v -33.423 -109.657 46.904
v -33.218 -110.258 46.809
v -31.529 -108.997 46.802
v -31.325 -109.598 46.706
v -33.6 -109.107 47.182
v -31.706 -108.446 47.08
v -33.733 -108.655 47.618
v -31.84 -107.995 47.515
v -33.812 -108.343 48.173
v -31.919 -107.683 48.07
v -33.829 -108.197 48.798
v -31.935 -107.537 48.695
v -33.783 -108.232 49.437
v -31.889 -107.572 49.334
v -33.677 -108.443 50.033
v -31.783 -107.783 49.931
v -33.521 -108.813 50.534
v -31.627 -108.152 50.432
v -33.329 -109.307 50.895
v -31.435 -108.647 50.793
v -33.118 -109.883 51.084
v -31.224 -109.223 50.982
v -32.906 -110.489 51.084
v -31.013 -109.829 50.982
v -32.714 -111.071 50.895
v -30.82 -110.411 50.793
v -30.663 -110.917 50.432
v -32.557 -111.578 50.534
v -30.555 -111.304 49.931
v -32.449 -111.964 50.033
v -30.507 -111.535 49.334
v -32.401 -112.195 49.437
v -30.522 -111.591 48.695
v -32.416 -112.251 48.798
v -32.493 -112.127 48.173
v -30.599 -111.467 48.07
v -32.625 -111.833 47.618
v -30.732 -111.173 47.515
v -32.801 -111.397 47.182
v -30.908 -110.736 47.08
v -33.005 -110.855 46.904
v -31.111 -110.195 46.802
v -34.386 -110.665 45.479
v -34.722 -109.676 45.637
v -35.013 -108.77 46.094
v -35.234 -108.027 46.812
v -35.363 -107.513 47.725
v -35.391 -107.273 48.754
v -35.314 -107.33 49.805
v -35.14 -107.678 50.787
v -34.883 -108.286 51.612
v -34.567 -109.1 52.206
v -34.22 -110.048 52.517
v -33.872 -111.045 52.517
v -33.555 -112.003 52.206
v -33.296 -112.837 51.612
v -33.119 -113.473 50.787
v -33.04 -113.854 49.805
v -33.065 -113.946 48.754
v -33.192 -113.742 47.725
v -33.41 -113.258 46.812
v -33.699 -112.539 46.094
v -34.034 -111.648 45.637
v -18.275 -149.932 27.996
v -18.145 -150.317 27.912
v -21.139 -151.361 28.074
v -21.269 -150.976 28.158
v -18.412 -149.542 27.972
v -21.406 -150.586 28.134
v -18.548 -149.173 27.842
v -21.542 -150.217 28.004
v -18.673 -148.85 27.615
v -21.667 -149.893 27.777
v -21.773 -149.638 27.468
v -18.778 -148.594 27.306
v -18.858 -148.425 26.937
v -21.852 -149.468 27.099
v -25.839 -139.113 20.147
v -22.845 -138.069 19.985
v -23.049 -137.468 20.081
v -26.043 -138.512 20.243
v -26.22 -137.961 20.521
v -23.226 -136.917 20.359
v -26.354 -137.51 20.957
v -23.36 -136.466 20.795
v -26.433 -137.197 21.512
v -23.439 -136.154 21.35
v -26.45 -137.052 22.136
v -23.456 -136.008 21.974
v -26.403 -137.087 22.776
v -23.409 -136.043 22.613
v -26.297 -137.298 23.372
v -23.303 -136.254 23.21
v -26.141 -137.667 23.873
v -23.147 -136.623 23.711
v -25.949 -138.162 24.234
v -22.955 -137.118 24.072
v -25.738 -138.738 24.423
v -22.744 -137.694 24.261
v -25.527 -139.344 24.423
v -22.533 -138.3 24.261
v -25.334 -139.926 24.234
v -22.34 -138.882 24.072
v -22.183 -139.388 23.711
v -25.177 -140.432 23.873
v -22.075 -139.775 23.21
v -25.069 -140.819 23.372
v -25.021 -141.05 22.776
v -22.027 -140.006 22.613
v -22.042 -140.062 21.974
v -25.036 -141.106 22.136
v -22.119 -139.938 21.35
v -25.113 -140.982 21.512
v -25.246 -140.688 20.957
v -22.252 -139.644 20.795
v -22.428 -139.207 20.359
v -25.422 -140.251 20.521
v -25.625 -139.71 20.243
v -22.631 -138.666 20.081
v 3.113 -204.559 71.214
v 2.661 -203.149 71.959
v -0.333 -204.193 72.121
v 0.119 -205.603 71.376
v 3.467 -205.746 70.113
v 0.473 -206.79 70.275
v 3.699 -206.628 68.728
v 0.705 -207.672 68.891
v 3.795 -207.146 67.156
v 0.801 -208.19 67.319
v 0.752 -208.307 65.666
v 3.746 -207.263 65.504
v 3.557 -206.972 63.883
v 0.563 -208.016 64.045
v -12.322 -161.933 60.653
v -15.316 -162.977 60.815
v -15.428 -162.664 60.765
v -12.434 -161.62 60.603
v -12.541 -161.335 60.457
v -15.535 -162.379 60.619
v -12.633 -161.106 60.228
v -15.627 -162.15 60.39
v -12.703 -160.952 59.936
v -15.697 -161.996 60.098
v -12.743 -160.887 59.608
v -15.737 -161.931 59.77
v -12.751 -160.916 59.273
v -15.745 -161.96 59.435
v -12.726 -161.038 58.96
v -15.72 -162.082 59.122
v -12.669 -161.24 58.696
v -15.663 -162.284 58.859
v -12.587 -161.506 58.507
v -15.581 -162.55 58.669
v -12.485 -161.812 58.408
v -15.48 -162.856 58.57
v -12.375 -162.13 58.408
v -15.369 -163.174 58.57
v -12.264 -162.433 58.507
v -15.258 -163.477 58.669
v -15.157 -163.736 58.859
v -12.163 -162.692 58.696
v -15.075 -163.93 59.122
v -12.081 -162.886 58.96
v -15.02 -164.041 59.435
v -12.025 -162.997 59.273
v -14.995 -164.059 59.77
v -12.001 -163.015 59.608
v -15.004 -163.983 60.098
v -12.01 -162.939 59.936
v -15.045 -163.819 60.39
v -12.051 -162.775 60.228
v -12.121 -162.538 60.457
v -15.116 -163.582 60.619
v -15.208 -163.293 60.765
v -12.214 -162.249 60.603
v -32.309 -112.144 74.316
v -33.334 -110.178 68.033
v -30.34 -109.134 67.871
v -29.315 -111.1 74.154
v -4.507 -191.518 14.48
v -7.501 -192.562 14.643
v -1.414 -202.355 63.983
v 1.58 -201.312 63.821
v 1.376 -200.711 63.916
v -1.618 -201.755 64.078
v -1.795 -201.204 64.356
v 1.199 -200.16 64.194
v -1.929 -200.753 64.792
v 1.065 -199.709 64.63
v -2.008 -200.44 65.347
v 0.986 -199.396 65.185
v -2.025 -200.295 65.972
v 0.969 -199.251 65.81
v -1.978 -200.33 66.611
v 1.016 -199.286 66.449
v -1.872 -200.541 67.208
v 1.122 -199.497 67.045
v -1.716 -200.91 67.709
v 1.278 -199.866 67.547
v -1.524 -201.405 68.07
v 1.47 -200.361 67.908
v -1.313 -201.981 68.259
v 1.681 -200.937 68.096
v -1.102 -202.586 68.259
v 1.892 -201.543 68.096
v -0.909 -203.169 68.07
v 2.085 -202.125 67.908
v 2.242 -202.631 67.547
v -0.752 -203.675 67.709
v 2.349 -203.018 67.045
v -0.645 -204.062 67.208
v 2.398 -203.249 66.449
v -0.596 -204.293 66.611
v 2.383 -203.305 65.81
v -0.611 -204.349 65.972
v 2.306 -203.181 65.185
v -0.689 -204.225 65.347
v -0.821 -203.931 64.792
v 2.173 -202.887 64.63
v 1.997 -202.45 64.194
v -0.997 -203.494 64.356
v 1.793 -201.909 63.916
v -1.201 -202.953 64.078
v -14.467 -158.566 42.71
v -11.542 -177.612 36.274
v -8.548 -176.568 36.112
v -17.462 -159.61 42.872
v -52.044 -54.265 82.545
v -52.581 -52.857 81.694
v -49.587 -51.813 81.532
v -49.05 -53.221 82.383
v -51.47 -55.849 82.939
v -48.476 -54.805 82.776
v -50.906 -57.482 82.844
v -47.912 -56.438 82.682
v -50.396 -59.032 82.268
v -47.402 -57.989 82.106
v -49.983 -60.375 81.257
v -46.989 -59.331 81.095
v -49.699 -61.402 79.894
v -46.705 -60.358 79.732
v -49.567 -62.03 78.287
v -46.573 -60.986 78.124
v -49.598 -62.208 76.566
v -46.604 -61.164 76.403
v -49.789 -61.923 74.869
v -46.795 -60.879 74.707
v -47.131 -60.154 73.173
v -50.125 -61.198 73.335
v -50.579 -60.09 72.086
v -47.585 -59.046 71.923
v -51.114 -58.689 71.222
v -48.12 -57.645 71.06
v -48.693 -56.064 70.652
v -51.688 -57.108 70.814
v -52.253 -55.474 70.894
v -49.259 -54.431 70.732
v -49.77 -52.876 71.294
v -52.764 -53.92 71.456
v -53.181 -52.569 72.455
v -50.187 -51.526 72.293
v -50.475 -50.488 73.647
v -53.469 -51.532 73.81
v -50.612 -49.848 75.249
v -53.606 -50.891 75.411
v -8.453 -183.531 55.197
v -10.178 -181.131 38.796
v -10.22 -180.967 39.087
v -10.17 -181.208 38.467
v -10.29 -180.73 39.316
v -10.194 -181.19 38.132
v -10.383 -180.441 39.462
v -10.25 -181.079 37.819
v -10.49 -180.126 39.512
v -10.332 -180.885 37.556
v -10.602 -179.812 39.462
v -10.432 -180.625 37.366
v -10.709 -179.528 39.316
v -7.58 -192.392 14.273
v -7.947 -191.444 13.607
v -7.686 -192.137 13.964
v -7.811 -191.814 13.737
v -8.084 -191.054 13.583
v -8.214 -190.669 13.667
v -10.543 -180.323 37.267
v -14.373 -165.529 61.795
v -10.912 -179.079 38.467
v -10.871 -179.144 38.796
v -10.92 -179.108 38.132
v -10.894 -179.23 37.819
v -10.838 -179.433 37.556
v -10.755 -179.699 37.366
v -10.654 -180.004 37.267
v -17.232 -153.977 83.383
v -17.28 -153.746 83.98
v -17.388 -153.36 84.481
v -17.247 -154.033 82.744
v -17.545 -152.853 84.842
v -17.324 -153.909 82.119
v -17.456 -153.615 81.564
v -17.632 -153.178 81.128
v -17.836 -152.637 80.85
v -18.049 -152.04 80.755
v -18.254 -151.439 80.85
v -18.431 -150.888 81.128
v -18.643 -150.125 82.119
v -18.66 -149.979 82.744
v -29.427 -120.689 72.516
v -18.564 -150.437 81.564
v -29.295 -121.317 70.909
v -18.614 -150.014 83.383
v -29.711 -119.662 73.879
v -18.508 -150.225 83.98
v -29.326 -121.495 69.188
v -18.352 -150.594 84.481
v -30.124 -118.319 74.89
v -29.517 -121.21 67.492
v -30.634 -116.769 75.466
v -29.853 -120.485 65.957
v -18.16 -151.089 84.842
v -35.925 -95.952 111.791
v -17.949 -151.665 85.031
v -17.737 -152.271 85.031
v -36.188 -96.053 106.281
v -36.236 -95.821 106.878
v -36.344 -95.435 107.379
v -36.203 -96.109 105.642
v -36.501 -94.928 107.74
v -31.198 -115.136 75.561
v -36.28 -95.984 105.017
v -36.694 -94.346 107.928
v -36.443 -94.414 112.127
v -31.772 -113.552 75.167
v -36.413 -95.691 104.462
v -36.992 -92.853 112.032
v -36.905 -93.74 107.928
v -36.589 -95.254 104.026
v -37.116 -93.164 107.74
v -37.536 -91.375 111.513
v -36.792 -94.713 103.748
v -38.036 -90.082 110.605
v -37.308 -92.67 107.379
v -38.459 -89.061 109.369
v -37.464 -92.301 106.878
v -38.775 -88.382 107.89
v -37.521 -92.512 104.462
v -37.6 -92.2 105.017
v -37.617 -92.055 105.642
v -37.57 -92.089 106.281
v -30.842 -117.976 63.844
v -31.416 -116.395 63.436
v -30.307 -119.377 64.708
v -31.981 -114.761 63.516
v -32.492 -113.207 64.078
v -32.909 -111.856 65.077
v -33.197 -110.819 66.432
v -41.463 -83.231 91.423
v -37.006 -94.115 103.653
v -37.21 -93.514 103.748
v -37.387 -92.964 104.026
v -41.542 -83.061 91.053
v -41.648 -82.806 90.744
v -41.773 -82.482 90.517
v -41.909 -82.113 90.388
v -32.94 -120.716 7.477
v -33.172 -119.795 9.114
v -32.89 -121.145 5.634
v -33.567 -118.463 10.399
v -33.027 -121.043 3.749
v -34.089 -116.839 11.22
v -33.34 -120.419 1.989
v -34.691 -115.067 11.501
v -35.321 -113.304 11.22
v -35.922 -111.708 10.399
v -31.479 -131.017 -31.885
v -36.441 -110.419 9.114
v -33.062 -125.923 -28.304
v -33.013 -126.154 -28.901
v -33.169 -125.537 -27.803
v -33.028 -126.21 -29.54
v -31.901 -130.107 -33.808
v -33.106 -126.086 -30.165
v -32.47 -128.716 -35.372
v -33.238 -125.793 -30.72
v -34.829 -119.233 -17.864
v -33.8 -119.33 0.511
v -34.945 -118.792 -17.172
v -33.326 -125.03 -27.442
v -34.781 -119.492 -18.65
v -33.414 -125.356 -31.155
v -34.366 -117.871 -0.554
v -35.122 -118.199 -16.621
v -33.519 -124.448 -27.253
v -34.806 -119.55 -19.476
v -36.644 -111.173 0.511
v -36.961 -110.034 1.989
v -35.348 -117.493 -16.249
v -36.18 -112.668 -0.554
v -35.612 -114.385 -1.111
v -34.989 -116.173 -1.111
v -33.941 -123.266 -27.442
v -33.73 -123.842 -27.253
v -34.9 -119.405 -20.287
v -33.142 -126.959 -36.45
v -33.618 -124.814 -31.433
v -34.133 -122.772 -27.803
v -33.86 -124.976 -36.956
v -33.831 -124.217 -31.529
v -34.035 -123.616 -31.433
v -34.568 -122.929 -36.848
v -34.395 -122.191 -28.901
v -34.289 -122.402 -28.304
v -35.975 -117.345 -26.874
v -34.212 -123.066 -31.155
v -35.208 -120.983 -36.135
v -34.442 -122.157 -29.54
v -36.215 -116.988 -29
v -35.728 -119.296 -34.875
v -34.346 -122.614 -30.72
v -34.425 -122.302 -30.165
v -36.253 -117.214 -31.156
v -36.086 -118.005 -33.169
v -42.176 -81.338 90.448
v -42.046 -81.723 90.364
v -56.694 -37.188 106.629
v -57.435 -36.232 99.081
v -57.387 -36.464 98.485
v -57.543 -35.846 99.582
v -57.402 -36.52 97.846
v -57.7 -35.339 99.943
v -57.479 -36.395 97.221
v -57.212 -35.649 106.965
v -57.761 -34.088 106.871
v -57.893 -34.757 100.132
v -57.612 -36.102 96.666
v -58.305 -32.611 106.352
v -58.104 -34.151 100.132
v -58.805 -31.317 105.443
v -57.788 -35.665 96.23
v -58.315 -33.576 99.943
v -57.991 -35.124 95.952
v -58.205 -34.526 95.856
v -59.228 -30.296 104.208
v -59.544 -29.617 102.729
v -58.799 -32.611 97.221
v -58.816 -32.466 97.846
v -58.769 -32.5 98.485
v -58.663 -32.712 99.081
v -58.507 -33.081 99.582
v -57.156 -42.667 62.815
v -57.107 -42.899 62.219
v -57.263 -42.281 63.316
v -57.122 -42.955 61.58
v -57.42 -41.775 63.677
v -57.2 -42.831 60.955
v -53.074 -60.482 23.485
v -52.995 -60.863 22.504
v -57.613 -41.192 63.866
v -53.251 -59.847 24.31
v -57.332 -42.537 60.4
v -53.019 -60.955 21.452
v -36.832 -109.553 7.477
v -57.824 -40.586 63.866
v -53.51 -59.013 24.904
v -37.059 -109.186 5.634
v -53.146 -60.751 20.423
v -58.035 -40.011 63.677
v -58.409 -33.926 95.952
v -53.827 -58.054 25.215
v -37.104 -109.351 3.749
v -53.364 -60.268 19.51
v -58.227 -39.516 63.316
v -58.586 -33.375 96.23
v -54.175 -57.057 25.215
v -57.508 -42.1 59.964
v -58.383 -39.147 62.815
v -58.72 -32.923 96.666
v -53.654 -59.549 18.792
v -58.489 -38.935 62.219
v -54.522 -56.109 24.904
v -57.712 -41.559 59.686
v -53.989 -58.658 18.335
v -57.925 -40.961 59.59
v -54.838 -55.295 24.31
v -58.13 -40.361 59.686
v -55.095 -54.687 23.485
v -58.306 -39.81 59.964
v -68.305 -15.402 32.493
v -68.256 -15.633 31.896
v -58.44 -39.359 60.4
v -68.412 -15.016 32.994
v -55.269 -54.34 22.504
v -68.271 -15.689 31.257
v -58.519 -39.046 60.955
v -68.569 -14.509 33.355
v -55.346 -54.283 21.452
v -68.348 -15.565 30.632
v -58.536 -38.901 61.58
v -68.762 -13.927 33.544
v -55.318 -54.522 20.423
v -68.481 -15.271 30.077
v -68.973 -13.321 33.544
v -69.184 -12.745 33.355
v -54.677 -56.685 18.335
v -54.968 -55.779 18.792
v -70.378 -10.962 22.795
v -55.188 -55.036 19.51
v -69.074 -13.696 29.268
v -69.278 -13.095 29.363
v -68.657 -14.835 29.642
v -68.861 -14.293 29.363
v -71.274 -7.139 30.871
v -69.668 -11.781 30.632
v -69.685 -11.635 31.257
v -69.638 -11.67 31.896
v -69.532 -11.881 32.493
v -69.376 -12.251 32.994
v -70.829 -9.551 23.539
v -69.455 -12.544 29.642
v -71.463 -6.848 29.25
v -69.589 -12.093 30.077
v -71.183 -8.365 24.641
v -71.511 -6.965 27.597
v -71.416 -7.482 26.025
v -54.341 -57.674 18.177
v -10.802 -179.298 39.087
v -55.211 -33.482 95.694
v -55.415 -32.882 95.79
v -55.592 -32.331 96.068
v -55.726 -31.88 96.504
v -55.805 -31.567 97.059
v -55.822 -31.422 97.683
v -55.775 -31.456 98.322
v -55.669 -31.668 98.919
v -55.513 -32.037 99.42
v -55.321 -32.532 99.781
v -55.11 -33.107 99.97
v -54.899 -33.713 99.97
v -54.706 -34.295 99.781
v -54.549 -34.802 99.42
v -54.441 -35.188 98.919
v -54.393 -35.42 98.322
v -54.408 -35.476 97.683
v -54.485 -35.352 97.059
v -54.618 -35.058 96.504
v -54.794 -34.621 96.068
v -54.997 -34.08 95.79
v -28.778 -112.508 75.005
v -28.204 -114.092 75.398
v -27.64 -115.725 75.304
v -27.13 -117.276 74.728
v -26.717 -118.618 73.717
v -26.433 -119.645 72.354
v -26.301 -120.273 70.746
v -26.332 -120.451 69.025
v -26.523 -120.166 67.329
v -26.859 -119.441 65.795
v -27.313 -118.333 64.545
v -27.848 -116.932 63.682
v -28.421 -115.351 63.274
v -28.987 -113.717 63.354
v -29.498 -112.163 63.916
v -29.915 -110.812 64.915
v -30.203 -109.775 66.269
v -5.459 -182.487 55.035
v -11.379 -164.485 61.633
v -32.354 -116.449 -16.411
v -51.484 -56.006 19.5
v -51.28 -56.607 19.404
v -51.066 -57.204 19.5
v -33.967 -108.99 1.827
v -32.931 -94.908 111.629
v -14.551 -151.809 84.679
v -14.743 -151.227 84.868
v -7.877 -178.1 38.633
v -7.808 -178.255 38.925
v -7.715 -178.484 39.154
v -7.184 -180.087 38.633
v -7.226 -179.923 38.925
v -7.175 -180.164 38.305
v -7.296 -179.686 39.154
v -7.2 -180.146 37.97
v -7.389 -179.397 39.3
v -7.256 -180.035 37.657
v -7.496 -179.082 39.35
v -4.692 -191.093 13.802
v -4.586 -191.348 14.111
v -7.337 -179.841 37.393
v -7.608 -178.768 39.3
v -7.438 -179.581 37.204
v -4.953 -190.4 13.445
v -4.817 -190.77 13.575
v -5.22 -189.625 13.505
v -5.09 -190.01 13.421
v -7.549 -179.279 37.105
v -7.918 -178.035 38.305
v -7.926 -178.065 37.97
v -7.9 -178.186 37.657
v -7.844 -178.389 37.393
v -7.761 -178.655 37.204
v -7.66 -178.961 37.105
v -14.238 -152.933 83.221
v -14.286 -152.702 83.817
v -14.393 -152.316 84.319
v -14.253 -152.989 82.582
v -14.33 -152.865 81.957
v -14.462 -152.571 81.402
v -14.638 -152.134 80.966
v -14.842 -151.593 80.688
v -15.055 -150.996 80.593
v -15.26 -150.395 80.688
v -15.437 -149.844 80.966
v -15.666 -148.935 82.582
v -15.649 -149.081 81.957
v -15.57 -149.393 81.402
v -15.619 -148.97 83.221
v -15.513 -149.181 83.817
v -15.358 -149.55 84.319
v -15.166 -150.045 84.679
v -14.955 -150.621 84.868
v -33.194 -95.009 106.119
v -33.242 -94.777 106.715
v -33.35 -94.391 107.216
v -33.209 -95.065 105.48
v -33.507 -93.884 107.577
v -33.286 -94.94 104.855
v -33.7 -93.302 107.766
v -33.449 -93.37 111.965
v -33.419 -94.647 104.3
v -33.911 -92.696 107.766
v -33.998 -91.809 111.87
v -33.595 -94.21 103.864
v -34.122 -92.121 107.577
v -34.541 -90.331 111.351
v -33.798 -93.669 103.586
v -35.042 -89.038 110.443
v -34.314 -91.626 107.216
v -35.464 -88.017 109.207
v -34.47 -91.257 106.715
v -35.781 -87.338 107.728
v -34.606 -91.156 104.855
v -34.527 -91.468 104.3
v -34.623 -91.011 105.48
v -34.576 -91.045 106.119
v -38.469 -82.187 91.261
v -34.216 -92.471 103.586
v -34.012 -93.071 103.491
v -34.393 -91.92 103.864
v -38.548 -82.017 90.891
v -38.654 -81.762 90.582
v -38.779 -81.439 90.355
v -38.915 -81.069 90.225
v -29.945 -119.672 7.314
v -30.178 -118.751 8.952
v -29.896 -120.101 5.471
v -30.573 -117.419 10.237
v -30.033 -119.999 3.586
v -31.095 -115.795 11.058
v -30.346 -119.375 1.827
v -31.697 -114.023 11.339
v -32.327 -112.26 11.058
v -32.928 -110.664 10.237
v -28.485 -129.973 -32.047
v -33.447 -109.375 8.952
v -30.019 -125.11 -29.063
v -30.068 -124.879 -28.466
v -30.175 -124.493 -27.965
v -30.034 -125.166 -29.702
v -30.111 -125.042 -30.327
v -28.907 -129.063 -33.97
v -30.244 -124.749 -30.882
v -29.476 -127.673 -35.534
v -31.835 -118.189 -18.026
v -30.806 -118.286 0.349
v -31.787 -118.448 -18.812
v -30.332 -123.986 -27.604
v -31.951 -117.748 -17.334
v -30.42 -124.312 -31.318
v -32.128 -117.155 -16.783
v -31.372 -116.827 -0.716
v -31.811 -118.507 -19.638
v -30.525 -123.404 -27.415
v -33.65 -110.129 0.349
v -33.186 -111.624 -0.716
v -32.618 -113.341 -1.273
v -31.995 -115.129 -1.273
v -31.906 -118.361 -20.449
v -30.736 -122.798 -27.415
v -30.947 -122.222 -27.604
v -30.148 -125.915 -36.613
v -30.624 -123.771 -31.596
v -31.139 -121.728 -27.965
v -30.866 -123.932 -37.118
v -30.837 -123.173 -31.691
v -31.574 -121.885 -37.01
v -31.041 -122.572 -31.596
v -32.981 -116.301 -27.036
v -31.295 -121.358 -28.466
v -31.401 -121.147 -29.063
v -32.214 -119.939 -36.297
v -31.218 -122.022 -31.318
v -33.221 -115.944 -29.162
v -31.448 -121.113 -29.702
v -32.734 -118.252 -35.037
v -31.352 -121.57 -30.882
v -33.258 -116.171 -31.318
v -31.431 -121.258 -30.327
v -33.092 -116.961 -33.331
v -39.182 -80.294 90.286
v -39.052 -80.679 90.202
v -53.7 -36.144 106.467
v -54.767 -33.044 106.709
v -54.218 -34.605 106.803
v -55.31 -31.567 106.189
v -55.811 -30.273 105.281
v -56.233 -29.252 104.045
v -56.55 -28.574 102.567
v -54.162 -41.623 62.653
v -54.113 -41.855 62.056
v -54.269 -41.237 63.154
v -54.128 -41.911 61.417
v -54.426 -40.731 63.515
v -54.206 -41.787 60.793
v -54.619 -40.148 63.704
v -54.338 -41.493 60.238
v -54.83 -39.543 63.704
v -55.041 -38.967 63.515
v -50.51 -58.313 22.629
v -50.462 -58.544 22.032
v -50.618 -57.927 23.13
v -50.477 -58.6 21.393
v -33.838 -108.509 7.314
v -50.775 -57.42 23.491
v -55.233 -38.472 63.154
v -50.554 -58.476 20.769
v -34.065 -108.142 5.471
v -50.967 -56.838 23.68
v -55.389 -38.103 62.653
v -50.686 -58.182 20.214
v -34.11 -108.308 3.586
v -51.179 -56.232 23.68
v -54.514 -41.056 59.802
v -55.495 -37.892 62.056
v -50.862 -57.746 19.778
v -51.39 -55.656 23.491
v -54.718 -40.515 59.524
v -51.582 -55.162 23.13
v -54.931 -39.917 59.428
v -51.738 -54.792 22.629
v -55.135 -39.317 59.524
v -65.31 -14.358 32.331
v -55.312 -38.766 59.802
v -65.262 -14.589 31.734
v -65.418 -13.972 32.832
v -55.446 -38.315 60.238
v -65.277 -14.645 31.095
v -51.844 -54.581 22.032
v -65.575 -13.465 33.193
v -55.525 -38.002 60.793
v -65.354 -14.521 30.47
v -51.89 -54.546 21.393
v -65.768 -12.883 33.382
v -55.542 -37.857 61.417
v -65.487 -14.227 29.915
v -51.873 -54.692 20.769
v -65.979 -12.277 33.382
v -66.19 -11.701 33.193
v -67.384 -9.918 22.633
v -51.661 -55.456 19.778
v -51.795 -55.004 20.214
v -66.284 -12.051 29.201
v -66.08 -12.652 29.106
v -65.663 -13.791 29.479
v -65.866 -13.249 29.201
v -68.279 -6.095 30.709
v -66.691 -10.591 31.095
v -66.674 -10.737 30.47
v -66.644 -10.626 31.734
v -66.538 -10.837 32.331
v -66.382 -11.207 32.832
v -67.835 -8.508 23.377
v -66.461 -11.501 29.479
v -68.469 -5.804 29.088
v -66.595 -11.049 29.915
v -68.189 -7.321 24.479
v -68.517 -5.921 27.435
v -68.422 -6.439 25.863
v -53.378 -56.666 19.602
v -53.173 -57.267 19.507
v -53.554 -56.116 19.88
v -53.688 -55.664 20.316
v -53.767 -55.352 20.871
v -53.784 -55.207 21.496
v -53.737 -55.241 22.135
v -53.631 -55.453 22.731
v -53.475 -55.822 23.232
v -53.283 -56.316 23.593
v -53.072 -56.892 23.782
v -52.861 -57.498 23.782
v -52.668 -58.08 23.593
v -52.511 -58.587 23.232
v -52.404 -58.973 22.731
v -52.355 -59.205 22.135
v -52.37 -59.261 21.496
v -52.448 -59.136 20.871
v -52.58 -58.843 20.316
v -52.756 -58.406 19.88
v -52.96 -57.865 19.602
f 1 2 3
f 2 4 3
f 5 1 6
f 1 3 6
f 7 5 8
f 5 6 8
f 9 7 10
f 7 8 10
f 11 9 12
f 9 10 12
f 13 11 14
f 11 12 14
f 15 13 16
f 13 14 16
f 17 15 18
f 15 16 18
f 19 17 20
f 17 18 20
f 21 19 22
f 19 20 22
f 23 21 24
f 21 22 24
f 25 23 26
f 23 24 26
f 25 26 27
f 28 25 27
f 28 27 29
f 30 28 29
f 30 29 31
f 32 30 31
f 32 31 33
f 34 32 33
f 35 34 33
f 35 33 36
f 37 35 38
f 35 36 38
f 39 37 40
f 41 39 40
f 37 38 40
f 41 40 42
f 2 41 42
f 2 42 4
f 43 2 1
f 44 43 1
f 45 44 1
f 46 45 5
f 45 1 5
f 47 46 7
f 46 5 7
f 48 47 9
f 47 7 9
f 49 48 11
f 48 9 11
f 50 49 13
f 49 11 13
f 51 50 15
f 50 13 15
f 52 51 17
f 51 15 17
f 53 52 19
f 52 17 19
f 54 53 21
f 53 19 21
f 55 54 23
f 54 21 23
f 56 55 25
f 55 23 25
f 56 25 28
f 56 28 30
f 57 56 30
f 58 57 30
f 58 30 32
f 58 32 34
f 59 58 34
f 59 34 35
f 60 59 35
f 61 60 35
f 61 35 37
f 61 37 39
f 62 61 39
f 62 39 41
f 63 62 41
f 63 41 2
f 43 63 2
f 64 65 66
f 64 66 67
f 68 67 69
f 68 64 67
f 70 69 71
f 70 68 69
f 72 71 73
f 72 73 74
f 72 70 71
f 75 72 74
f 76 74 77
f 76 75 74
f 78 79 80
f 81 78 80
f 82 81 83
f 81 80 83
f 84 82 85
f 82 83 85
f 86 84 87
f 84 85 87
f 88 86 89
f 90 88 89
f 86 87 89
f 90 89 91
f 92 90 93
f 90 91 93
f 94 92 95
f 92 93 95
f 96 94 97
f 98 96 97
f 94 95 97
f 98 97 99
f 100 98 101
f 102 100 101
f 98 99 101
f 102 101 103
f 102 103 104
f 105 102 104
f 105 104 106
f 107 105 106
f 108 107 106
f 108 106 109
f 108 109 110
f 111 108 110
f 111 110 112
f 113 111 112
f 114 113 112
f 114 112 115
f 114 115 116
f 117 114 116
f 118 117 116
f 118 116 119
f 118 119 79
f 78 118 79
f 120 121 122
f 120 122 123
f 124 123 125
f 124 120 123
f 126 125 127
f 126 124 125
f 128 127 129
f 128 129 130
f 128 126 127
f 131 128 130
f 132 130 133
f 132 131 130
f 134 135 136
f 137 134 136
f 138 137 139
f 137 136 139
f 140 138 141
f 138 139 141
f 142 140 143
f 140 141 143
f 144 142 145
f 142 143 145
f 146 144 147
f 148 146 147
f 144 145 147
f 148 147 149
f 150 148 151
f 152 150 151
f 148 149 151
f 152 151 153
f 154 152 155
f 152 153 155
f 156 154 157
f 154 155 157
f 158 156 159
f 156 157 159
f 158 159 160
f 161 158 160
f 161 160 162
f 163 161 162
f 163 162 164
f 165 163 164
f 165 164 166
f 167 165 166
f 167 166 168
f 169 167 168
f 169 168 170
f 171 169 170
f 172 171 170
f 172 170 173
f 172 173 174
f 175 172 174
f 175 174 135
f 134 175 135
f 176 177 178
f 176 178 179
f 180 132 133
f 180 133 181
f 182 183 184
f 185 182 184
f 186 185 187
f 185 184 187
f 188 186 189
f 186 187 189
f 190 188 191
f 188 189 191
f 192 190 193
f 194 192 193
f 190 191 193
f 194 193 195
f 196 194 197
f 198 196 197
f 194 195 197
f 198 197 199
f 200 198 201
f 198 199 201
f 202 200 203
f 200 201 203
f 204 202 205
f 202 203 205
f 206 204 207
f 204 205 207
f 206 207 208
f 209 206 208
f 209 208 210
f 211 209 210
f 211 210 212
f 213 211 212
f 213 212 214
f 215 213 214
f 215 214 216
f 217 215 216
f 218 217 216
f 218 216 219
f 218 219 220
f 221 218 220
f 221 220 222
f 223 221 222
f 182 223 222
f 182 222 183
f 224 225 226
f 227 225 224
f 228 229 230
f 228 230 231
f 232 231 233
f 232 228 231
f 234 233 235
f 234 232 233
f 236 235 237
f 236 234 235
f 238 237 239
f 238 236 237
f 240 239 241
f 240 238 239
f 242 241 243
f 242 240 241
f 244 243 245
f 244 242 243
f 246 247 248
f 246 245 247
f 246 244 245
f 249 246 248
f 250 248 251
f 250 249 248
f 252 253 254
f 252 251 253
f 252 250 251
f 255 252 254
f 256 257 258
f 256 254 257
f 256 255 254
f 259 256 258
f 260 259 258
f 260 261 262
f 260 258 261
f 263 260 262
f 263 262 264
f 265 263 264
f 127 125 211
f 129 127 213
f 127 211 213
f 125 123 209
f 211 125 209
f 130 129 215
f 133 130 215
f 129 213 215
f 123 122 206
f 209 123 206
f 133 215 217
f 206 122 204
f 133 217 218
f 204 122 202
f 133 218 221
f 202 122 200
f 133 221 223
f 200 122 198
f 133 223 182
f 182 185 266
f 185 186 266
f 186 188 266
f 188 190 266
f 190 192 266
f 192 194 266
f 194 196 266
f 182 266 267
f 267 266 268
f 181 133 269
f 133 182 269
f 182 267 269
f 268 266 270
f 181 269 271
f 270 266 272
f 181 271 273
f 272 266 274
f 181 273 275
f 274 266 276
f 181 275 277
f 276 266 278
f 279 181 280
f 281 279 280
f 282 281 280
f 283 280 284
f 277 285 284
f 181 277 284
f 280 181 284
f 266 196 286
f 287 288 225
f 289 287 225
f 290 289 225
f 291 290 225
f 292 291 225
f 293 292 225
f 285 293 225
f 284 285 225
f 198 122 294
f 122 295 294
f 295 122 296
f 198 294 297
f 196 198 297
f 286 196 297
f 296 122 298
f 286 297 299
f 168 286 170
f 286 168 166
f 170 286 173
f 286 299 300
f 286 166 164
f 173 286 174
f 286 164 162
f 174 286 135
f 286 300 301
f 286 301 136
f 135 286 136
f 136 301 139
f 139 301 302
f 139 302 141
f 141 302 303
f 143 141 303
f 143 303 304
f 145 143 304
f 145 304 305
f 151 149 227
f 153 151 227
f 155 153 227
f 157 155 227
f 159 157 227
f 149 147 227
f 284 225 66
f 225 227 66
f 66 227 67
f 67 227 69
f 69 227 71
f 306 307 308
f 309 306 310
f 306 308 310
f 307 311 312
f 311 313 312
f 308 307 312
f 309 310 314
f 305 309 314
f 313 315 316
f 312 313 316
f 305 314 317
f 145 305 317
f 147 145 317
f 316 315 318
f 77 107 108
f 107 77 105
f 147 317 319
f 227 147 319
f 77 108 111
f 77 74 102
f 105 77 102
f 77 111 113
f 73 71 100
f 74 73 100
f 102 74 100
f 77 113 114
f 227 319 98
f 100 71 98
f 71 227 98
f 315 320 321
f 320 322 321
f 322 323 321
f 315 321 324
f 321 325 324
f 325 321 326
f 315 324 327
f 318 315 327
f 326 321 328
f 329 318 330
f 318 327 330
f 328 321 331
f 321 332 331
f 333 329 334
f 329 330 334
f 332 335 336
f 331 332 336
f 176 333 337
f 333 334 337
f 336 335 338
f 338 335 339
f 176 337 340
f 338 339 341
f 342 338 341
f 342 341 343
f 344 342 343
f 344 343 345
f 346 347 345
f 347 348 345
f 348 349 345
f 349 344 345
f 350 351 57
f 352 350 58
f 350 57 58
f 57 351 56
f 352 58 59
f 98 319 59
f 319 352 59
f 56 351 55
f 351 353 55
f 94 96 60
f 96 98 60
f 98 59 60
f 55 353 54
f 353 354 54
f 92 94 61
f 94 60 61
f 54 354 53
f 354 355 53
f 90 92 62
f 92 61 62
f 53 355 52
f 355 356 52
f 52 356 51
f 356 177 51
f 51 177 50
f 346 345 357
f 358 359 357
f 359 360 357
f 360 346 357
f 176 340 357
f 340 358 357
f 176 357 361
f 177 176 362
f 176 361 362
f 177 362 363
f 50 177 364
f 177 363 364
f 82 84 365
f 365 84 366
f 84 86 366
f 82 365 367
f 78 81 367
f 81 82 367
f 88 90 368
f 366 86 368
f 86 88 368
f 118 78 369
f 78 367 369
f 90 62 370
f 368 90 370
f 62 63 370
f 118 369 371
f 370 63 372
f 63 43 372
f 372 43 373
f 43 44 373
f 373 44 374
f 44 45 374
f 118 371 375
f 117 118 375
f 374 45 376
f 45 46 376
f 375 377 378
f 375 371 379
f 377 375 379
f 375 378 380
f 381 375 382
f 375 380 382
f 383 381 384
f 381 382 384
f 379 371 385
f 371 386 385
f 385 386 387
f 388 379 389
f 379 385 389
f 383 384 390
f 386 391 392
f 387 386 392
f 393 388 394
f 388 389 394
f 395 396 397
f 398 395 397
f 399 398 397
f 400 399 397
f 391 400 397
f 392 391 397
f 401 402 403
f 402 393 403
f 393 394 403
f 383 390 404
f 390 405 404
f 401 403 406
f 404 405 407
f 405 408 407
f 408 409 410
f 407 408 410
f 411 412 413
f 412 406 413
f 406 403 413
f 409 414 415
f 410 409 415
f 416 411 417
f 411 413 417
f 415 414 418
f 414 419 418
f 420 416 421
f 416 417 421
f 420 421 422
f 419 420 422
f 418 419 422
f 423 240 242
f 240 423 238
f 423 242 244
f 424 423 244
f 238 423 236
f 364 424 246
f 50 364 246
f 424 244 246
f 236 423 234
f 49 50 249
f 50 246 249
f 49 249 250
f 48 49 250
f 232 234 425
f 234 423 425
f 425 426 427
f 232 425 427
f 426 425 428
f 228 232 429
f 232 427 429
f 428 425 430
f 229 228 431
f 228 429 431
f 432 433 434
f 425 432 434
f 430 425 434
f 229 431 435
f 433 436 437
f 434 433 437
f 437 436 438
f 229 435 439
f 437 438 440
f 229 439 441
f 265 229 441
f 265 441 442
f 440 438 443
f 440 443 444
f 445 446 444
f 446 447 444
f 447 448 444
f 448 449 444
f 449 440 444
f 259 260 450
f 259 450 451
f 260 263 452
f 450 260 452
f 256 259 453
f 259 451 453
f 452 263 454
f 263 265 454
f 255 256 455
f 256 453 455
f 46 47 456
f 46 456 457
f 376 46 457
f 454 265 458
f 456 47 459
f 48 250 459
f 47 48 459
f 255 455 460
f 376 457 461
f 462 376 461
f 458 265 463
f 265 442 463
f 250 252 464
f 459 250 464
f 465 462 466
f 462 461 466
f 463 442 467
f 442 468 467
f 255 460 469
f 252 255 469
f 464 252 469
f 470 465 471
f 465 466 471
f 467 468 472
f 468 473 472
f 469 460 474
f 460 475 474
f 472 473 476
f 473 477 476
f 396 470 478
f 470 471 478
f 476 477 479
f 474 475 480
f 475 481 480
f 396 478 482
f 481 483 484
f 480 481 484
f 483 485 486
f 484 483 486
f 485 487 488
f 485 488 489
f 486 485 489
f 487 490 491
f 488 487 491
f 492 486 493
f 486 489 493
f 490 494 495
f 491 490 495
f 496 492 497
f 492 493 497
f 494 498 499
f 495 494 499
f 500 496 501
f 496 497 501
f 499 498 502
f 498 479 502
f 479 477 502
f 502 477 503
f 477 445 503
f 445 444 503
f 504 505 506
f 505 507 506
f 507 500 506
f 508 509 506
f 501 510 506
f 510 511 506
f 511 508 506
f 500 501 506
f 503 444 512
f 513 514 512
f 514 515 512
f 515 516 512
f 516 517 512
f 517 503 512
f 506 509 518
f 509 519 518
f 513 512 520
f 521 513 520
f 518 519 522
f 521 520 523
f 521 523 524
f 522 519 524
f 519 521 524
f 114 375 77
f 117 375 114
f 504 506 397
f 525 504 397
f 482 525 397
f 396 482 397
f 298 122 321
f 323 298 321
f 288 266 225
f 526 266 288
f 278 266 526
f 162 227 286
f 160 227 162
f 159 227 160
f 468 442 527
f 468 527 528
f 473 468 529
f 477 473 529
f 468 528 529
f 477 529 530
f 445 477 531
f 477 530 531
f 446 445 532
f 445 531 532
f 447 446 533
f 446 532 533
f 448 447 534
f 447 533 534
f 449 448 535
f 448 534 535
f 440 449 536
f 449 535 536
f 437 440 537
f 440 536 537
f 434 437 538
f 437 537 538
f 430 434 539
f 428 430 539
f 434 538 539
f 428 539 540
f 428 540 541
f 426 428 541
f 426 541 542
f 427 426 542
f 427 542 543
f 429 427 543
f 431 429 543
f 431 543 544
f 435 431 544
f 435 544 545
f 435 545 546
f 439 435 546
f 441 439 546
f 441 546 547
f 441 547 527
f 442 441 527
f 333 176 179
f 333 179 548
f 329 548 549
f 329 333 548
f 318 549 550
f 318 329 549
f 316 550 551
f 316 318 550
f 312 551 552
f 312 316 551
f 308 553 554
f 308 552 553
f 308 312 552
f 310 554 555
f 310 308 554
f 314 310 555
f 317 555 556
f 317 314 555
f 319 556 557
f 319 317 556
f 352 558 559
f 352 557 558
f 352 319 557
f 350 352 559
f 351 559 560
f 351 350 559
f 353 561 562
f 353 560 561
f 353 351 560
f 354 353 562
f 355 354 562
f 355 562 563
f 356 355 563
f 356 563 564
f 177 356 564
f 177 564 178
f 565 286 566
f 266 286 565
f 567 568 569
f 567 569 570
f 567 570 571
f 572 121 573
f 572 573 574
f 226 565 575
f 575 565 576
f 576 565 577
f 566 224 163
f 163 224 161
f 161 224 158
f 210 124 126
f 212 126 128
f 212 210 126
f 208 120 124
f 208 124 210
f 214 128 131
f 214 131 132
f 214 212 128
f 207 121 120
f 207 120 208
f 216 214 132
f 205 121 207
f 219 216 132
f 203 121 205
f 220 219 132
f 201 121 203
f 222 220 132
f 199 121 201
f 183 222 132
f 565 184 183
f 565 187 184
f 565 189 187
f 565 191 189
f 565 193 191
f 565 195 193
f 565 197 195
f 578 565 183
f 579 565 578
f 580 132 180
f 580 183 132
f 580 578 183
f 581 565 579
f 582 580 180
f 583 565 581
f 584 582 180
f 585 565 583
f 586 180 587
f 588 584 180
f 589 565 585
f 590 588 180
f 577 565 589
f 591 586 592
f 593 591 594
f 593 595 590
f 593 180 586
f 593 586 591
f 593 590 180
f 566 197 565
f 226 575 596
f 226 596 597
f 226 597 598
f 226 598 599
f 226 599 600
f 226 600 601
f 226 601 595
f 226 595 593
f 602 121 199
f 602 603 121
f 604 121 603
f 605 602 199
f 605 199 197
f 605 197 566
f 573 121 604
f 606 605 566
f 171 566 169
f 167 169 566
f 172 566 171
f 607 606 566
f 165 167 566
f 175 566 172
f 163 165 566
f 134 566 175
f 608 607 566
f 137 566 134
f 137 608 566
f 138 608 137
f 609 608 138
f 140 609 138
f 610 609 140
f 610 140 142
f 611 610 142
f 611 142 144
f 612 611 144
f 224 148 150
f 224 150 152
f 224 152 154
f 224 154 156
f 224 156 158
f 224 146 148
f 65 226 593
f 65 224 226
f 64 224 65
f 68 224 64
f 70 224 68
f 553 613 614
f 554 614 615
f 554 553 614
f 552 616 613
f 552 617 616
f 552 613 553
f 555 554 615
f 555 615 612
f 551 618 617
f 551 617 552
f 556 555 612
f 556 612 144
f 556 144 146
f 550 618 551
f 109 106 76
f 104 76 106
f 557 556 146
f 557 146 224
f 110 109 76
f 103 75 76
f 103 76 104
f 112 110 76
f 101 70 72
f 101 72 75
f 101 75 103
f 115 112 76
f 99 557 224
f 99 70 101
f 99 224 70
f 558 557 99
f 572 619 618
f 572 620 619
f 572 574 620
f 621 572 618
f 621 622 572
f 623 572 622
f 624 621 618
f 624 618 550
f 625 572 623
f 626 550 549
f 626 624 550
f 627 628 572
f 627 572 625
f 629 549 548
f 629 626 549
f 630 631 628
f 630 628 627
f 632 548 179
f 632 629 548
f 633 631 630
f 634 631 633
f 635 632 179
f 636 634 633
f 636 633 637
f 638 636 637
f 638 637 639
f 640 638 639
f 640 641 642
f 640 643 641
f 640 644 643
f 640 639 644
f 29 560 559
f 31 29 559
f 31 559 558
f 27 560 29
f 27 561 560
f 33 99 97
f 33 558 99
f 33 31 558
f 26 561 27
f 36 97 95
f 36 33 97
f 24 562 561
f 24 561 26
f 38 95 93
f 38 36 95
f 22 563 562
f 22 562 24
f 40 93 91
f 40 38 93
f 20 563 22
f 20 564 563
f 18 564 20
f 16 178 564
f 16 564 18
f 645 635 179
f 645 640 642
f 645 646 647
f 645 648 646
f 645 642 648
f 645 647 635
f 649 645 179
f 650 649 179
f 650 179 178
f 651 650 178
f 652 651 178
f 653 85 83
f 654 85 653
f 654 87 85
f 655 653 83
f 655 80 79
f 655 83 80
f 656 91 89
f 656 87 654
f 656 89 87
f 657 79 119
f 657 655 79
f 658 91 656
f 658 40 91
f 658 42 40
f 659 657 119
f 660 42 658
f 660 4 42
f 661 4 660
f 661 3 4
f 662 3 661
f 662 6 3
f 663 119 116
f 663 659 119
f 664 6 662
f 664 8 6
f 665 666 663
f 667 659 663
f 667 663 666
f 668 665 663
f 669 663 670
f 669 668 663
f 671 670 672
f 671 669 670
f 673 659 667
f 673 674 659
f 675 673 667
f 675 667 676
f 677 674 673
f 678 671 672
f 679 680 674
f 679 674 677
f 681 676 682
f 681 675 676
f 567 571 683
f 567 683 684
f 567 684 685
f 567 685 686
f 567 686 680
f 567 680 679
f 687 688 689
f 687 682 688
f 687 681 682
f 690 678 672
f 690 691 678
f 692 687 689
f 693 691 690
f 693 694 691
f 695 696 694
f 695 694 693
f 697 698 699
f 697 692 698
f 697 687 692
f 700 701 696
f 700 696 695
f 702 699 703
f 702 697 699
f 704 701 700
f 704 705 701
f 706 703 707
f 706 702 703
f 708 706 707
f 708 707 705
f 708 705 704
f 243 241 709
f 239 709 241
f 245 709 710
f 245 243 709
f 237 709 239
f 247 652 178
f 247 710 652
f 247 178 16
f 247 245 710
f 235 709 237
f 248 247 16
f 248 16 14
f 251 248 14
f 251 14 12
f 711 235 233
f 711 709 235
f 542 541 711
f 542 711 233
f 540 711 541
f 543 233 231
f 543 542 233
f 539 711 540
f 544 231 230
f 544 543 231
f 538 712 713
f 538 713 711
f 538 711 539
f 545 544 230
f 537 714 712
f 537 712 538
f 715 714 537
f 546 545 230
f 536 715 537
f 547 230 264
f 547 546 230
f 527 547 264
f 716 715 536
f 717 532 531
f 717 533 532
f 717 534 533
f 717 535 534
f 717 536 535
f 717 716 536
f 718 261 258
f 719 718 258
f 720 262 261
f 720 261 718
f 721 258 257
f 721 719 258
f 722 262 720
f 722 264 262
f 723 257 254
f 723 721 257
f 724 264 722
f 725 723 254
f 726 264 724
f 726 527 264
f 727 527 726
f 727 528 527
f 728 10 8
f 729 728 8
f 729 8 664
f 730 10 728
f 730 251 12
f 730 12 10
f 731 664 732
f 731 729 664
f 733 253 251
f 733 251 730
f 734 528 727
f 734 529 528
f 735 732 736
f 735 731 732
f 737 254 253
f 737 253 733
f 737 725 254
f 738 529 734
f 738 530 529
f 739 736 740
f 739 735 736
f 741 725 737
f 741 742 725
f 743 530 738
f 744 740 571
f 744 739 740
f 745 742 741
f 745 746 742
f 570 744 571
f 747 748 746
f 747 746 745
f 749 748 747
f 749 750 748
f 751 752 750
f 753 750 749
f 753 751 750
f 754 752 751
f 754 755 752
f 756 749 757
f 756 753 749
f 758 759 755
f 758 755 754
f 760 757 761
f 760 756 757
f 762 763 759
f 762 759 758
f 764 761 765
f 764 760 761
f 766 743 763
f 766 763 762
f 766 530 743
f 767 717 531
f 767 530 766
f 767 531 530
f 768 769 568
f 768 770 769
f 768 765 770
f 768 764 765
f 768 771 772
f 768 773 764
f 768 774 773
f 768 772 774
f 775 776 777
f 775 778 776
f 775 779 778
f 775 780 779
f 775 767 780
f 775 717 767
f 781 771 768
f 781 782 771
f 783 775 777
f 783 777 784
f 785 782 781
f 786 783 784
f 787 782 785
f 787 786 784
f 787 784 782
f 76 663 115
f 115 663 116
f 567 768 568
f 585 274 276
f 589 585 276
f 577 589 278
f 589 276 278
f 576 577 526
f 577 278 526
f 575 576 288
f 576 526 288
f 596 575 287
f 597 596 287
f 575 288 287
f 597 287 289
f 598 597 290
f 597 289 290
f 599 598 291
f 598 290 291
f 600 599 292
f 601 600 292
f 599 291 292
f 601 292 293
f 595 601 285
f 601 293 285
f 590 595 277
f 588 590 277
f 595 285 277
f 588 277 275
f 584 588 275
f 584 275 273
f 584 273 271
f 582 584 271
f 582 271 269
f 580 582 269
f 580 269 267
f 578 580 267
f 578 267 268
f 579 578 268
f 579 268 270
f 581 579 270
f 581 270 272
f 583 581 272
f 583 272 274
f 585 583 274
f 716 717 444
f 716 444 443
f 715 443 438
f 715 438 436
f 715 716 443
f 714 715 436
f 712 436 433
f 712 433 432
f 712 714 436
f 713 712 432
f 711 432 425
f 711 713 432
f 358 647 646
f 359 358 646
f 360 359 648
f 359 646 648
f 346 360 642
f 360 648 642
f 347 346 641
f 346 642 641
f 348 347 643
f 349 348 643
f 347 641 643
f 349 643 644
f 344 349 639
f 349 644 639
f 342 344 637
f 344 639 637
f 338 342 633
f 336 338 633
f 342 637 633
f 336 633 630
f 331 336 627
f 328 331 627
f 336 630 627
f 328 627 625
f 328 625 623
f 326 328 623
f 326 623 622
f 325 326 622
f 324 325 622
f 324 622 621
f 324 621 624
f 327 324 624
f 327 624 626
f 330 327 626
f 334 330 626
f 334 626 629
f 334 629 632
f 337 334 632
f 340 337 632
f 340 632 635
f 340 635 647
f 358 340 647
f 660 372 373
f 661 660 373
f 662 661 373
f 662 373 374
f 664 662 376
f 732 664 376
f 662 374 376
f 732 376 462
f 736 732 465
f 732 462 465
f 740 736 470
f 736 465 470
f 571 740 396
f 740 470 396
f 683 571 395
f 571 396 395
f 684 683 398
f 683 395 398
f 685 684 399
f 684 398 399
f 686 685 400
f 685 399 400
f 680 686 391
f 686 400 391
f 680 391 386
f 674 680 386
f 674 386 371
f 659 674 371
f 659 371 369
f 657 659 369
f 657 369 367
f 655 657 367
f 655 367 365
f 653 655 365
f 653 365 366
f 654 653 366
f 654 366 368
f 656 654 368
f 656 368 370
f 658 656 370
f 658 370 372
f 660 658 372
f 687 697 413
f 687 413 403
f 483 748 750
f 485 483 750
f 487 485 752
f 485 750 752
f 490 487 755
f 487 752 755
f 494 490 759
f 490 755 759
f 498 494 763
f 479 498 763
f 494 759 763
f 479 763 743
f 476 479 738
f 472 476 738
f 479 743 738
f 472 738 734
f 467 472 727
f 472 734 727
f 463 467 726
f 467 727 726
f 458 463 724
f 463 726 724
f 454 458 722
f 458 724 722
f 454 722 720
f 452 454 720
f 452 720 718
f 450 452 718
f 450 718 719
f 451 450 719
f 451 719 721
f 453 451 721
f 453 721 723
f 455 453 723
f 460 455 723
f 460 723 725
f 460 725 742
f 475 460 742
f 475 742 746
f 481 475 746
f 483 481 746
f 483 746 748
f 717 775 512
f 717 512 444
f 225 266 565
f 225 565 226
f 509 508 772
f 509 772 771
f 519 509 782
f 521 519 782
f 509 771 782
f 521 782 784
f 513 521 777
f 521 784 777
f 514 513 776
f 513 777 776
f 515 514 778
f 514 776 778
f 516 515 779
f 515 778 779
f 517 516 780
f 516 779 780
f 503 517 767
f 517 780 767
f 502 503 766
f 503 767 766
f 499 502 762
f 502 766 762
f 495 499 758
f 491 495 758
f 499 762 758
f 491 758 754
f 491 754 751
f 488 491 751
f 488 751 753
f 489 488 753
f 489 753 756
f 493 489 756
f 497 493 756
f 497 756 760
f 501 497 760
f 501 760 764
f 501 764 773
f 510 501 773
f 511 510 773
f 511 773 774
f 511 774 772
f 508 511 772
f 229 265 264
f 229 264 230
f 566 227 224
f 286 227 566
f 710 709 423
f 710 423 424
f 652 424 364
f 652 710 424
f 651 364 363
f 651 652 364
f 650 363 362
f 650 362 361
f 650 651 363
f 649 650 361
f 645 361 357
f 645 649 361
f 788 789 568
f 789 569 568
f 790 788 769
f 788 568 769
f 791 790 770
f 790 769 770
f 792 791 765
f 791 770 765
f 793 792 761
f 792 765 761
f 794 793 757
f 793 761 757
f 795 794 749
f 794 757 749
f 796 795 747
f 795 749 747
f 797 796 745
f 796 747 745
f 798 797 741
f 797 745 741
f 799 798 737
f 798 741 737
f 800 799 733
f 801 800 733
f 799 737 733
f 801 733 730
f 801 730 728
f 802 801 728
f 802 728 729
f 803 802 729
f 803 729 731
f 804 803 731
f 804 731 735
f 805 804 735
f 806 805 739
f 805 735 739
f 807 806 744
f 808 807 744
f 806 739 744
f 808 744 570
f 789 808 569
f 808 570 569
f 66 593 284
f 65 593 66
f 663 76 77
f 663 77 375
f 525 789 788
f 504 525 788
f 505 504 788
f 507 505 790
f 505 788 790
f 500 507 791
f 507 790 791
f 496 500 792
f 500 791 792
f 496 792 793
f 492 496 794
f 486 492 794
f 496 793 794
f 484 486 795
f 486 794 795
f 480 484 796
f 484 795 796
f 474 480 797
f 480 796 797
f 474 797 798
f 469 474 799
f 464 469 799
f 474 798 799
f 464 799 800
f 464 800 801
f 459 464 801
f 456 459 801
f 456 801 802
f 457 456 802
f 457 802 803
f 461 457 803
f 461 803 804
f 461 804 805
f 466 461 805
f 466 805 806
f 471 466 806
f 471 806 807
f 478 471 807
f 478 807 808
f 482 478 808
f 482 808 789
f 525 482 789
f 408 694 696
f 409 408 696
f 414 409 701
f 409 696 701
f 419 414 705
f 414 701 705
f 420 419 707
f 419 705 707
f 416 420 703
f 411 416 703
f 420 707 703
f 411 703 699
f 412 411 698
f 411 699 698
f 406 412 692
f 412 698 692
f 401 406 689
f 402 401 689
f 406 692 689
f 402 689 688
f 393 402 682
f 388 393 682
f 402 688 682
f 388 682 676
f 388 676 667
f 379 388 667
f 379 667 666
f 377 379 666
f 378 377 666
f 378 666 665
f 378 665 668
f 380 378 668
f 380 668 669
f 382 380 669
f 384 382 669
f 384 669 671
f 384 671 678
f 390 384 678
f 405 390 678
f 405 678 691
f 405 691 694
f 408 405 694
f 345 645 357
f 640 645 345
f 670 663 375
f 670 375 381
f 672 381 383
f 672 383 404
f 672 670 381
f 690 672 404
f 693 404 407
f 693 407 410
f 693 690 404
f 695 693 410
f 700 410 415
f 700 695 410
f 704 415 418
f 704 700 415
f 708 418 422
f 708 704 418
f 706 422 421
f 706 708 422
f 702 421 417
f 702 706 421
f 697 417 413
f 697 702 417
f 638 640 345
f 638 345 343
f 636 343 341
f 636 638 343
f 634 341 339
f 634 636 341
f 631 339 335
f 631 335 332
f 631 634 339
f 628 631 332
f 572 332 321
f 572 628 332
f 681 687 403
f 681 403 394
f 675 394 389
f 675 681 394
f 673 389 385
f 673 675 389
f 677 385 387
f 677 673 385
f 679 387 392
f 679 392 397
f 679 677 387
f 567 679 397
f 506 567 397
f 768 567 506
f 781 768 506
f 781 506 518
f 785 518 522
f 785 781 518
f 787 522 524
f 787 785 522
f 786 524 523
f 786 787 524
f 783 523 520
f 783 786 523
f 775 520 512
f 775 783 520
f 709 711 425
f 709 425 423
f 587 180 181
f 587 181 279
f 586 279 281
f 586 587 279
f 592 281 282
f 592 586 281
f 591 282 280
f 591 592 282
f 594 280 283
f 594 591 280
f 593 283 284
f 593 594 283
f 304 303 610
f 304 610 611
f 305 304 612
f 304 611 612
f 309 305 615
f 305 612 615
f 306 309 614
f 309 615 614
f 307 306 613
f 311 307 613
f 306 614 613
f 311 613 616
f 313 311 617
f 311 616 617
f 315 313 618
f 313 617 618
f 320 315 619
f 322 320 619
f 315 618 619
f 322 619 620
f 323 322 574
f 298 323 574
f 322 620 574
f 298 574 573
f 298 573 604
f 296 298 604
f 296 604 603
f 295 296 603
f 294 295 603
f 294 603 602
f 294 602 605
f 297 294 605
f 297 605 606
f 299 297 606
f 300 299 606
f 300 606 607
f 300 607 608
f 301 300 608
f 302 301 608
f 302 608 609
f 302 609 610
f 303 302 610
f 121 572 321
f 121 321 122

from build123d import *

# Parameters (mm, degrees)
BOSS_EXTRUDE1_DEPTH                               = 3.175
F_6_CLEARANCE_HOLE2_D                             = 4.3053
CUT_EXTRUDE1_DEPTH                                = 75.708255191
CUT_EXTRUDE11_DEPTH                               = 75.708255191
SKETCH112_R                                       = 6.35
CUT_EXTRUDE13_DEPTH                               = 75.708255191
CSK_FOR_6_FLAT_HEAD_MACHINE_SCREW_100_D           = 4.3053
CSK_FOR_6_FLAT_HEAD_MACHINE_SCREW_100_CSINK_D     = 7.0866
CSK_FOR_6_FLAT_HEAD_MACHINE_SCREW_100_CSINK_ANGLE = 100
F_2_CLEARANCE_HOLE1_D                             = 2.2606
F_2_CLEARANCE_HOLE1_DEPTH                         = 3.175


with BuildPart() as part:
    # Sketch2 → Boss-Extrude1 (new body)
    with BuildSketch(Plane(origin=(-64.088304417, -22.345630777, 3.470722632), x_dir=(-0.153926818, 0.29499983, -0.943017304), z_dir=(0.943017304, 0.328801279, -0.051069404))):
        with BuildLine():
            Line((-121.846755419, -165.728170273), (-69.459255419, -165.728170273))
            ThreePointArc((-69.459255419, -165.728170273), (-68.336723403, -165.263202289), (-67.871755419, -164.140670273))
            Line((-67.871755419, -164.140670273), (-67.871755419, -120.325670273))
            ThreePointArc((-67.871755419, -120.325670273), (-67.406787434, -119.203138258), (-66.284255419, -118.738170273))
            Line((-66.284255419, -118.738170273), (-3.736755419, -118.738170273))
            ThreePointArc((-3.736755419, -118.738170273), (3.883244581, -111.118170273), (-3.736755419, -103.498170273))
            Line((-3.736755419, -103.498170273), (-10.721755419, -103.498170273))
            ThreePointArc((-10.721755419, -103.498170273), (-12.966819449, -102.568234304), (-13.896755419, -100.323170273))
            Line((-13.896755419, -100.323170273), (-13.896755419, 18.421829727))
            ThreePointArc((-13.896755419, 18.421829727), (-15.756627358, 22.911957787), (-20.246755419, 24.771829727))
            Line((-20.246755419, 24.771829727), (-96.446755419, 24.771829727))
            ThreePointArc((-96.446755419, 24.771829727), (-100.936883479, 22.911957787), (-102.796755419, 18.421829727))
            Line((-102.796755419, 18.421829727), (-102.796755419, -30.790670273))
            ThreePointArc((-102.796755419, -30.790670273), (-103.261723403, -31.913202289), (-104.384255419, -32.378170273))
            Line((-104.384255419, -32.378170273), (-121.846755419, -32.378170273))
            ThreePointArc((-121.846755419, -32.378170273), (-126.336883479, -34.238042213), (-128.196755419, -38.728170273))
            Line((-128.196755419, -38.728170273), (-128.196755419, -159.378170273))
            ThreePointArc((-128.196755419, -159.378170273), (-126.336883479, -163.868298334), (-121.846755419, -165.728170273))
        make_face()
    extrude(amount=-BOSS_EXTRUDE1_DEPTH)

    # #6 Clearance Hole2 (through all)
    with Locations(Plane(origin=(-67.082384355, -23.389574839, 3.632867989), x_dir=(0.048222256, 0.016813625, 0.998695107), z_dir=(-0.943017304, -0.328801279, 0.051069404))):
        with Locations((94.496598047, -13.438577508), (27.821256, 9.809074133), (102.303221602, -76.684769209), (58.183274109, -19.607002634), (18.688641338, -122.850003783), (-33.055104908, -106.153526298), (79.375410017, -137.620951141), (62.581514662, -190.608465154)):
            Hole(F_6_CLEARANCE_HOLE2_D / 2)

    # Sketch11 → Cut-Extrude1 (cut, through all)
    with BuildSketch(Plane(origin=(-30.199339451, -118.769533988, 70.606372837), x_dir=(0.153926818, -0.29499983, 0.943017304), z_dir=(-0.943017304, -0.328801279, 0.051069404))):
        with BuildLine():
            Line((-5.443361979, 7.786170805), (1.218801886, 7.786170805))
            ThreePointArc((1.218801886, 7.786170805), (-2.112280046, -3.415229195), (-5.443361979, 7.786170805))
        make_face()
    extrude(amount=-CUT_EXTRUDE1_DEPTH, mode=Mode.SUBTRACT)

    # Sketch111 → Cut-Extrude11 (cut, through all)
    with BuildSketch(Plane(origin=(-50.471339887, -59.482551247, 77.984343899), x_dir=(0.153926818, -0.29499983, 0.943017304), z_dir=(-0.943017304, -0.328801279, 0.051069404))):
        with BuildLine():
            Line((-5.443361979, 7.786170805), (1.218801886, 7.786170805))
            ThreePointArc((1.218801886, 7.786170805), (-2.112280046, -3.415229195), (-5.443361979, 7.786170805))
        make_face()
    extrude(amount=-CUT_EXTRUDE11_DEPTH, mode=Mode.SUBTRACT)

    # Sketch112 → Cut-Extrude13 (cut, through all)
    with BuildSketch(Plane(origin=(-67.082384355, -23.389574839, 3.632867989), x_dir=(0.048222256, 0.016813625, 0.998695107), z_dir=(-0.943017304, -0.328801279, 0.051069404))):
        with Locations((1.528822601, -97.230139831)):
            Circle(SKETCH112_R)
        Polygon((51.631528484, -170.516238748), (32.684219053, -163.909891699), (39.290566102, -144.962582268), (58.237875533, -151.568929317), align=None)
    extrude(amount=-CUT_EXTRUDE13_DEPTH, mode=Mode.SUBTRACT)

    # CSK for #6 Flat Head Machine Screw (100)1 (through all)
    with Locations(Plane(origin=(-67.082384355, -23.389574839, 3.632867989), x_dir=(0.048222256, 0.016813625, 0.998695107), z_dir=(-0.943017304, -0.328801279, 0.051069404))):
        with Locations((18.106841092, -36.568198954), (45.444415988, -93.174400017)):
            CounterSinkHole(CSK_FOR_6_FLAT_HEAD_MACHINE_SCREW_100_D / 2, CSK_FOR_6_FLAT_HEAD_MACHINE_SCREW_100_CSINK_D / 2, counter_sink_angle=CSK_FOR_6_FLAT_HEAD_MACHINE_SCREW_100_CSINK_ANGLE)

    # #2 Clearance Hole1
    with Locations(Plane(origin=(-64.088304417, -22.345630777, 3.470722632), x_dir=(-0.048222256, -0.016813625, -0.998695107), z_dir=(0.943017304, 0.328801279, -0.051069404))):
        with Locations((-34.795660006, -166.629937328), (-56.12643458, -148.848883687)):
            Hole(F_2_CLEARANCE_HOLE1_D / 2, depth=F_2_CLEARANCE_HOLE1_DEPTH)


solid = part.part
